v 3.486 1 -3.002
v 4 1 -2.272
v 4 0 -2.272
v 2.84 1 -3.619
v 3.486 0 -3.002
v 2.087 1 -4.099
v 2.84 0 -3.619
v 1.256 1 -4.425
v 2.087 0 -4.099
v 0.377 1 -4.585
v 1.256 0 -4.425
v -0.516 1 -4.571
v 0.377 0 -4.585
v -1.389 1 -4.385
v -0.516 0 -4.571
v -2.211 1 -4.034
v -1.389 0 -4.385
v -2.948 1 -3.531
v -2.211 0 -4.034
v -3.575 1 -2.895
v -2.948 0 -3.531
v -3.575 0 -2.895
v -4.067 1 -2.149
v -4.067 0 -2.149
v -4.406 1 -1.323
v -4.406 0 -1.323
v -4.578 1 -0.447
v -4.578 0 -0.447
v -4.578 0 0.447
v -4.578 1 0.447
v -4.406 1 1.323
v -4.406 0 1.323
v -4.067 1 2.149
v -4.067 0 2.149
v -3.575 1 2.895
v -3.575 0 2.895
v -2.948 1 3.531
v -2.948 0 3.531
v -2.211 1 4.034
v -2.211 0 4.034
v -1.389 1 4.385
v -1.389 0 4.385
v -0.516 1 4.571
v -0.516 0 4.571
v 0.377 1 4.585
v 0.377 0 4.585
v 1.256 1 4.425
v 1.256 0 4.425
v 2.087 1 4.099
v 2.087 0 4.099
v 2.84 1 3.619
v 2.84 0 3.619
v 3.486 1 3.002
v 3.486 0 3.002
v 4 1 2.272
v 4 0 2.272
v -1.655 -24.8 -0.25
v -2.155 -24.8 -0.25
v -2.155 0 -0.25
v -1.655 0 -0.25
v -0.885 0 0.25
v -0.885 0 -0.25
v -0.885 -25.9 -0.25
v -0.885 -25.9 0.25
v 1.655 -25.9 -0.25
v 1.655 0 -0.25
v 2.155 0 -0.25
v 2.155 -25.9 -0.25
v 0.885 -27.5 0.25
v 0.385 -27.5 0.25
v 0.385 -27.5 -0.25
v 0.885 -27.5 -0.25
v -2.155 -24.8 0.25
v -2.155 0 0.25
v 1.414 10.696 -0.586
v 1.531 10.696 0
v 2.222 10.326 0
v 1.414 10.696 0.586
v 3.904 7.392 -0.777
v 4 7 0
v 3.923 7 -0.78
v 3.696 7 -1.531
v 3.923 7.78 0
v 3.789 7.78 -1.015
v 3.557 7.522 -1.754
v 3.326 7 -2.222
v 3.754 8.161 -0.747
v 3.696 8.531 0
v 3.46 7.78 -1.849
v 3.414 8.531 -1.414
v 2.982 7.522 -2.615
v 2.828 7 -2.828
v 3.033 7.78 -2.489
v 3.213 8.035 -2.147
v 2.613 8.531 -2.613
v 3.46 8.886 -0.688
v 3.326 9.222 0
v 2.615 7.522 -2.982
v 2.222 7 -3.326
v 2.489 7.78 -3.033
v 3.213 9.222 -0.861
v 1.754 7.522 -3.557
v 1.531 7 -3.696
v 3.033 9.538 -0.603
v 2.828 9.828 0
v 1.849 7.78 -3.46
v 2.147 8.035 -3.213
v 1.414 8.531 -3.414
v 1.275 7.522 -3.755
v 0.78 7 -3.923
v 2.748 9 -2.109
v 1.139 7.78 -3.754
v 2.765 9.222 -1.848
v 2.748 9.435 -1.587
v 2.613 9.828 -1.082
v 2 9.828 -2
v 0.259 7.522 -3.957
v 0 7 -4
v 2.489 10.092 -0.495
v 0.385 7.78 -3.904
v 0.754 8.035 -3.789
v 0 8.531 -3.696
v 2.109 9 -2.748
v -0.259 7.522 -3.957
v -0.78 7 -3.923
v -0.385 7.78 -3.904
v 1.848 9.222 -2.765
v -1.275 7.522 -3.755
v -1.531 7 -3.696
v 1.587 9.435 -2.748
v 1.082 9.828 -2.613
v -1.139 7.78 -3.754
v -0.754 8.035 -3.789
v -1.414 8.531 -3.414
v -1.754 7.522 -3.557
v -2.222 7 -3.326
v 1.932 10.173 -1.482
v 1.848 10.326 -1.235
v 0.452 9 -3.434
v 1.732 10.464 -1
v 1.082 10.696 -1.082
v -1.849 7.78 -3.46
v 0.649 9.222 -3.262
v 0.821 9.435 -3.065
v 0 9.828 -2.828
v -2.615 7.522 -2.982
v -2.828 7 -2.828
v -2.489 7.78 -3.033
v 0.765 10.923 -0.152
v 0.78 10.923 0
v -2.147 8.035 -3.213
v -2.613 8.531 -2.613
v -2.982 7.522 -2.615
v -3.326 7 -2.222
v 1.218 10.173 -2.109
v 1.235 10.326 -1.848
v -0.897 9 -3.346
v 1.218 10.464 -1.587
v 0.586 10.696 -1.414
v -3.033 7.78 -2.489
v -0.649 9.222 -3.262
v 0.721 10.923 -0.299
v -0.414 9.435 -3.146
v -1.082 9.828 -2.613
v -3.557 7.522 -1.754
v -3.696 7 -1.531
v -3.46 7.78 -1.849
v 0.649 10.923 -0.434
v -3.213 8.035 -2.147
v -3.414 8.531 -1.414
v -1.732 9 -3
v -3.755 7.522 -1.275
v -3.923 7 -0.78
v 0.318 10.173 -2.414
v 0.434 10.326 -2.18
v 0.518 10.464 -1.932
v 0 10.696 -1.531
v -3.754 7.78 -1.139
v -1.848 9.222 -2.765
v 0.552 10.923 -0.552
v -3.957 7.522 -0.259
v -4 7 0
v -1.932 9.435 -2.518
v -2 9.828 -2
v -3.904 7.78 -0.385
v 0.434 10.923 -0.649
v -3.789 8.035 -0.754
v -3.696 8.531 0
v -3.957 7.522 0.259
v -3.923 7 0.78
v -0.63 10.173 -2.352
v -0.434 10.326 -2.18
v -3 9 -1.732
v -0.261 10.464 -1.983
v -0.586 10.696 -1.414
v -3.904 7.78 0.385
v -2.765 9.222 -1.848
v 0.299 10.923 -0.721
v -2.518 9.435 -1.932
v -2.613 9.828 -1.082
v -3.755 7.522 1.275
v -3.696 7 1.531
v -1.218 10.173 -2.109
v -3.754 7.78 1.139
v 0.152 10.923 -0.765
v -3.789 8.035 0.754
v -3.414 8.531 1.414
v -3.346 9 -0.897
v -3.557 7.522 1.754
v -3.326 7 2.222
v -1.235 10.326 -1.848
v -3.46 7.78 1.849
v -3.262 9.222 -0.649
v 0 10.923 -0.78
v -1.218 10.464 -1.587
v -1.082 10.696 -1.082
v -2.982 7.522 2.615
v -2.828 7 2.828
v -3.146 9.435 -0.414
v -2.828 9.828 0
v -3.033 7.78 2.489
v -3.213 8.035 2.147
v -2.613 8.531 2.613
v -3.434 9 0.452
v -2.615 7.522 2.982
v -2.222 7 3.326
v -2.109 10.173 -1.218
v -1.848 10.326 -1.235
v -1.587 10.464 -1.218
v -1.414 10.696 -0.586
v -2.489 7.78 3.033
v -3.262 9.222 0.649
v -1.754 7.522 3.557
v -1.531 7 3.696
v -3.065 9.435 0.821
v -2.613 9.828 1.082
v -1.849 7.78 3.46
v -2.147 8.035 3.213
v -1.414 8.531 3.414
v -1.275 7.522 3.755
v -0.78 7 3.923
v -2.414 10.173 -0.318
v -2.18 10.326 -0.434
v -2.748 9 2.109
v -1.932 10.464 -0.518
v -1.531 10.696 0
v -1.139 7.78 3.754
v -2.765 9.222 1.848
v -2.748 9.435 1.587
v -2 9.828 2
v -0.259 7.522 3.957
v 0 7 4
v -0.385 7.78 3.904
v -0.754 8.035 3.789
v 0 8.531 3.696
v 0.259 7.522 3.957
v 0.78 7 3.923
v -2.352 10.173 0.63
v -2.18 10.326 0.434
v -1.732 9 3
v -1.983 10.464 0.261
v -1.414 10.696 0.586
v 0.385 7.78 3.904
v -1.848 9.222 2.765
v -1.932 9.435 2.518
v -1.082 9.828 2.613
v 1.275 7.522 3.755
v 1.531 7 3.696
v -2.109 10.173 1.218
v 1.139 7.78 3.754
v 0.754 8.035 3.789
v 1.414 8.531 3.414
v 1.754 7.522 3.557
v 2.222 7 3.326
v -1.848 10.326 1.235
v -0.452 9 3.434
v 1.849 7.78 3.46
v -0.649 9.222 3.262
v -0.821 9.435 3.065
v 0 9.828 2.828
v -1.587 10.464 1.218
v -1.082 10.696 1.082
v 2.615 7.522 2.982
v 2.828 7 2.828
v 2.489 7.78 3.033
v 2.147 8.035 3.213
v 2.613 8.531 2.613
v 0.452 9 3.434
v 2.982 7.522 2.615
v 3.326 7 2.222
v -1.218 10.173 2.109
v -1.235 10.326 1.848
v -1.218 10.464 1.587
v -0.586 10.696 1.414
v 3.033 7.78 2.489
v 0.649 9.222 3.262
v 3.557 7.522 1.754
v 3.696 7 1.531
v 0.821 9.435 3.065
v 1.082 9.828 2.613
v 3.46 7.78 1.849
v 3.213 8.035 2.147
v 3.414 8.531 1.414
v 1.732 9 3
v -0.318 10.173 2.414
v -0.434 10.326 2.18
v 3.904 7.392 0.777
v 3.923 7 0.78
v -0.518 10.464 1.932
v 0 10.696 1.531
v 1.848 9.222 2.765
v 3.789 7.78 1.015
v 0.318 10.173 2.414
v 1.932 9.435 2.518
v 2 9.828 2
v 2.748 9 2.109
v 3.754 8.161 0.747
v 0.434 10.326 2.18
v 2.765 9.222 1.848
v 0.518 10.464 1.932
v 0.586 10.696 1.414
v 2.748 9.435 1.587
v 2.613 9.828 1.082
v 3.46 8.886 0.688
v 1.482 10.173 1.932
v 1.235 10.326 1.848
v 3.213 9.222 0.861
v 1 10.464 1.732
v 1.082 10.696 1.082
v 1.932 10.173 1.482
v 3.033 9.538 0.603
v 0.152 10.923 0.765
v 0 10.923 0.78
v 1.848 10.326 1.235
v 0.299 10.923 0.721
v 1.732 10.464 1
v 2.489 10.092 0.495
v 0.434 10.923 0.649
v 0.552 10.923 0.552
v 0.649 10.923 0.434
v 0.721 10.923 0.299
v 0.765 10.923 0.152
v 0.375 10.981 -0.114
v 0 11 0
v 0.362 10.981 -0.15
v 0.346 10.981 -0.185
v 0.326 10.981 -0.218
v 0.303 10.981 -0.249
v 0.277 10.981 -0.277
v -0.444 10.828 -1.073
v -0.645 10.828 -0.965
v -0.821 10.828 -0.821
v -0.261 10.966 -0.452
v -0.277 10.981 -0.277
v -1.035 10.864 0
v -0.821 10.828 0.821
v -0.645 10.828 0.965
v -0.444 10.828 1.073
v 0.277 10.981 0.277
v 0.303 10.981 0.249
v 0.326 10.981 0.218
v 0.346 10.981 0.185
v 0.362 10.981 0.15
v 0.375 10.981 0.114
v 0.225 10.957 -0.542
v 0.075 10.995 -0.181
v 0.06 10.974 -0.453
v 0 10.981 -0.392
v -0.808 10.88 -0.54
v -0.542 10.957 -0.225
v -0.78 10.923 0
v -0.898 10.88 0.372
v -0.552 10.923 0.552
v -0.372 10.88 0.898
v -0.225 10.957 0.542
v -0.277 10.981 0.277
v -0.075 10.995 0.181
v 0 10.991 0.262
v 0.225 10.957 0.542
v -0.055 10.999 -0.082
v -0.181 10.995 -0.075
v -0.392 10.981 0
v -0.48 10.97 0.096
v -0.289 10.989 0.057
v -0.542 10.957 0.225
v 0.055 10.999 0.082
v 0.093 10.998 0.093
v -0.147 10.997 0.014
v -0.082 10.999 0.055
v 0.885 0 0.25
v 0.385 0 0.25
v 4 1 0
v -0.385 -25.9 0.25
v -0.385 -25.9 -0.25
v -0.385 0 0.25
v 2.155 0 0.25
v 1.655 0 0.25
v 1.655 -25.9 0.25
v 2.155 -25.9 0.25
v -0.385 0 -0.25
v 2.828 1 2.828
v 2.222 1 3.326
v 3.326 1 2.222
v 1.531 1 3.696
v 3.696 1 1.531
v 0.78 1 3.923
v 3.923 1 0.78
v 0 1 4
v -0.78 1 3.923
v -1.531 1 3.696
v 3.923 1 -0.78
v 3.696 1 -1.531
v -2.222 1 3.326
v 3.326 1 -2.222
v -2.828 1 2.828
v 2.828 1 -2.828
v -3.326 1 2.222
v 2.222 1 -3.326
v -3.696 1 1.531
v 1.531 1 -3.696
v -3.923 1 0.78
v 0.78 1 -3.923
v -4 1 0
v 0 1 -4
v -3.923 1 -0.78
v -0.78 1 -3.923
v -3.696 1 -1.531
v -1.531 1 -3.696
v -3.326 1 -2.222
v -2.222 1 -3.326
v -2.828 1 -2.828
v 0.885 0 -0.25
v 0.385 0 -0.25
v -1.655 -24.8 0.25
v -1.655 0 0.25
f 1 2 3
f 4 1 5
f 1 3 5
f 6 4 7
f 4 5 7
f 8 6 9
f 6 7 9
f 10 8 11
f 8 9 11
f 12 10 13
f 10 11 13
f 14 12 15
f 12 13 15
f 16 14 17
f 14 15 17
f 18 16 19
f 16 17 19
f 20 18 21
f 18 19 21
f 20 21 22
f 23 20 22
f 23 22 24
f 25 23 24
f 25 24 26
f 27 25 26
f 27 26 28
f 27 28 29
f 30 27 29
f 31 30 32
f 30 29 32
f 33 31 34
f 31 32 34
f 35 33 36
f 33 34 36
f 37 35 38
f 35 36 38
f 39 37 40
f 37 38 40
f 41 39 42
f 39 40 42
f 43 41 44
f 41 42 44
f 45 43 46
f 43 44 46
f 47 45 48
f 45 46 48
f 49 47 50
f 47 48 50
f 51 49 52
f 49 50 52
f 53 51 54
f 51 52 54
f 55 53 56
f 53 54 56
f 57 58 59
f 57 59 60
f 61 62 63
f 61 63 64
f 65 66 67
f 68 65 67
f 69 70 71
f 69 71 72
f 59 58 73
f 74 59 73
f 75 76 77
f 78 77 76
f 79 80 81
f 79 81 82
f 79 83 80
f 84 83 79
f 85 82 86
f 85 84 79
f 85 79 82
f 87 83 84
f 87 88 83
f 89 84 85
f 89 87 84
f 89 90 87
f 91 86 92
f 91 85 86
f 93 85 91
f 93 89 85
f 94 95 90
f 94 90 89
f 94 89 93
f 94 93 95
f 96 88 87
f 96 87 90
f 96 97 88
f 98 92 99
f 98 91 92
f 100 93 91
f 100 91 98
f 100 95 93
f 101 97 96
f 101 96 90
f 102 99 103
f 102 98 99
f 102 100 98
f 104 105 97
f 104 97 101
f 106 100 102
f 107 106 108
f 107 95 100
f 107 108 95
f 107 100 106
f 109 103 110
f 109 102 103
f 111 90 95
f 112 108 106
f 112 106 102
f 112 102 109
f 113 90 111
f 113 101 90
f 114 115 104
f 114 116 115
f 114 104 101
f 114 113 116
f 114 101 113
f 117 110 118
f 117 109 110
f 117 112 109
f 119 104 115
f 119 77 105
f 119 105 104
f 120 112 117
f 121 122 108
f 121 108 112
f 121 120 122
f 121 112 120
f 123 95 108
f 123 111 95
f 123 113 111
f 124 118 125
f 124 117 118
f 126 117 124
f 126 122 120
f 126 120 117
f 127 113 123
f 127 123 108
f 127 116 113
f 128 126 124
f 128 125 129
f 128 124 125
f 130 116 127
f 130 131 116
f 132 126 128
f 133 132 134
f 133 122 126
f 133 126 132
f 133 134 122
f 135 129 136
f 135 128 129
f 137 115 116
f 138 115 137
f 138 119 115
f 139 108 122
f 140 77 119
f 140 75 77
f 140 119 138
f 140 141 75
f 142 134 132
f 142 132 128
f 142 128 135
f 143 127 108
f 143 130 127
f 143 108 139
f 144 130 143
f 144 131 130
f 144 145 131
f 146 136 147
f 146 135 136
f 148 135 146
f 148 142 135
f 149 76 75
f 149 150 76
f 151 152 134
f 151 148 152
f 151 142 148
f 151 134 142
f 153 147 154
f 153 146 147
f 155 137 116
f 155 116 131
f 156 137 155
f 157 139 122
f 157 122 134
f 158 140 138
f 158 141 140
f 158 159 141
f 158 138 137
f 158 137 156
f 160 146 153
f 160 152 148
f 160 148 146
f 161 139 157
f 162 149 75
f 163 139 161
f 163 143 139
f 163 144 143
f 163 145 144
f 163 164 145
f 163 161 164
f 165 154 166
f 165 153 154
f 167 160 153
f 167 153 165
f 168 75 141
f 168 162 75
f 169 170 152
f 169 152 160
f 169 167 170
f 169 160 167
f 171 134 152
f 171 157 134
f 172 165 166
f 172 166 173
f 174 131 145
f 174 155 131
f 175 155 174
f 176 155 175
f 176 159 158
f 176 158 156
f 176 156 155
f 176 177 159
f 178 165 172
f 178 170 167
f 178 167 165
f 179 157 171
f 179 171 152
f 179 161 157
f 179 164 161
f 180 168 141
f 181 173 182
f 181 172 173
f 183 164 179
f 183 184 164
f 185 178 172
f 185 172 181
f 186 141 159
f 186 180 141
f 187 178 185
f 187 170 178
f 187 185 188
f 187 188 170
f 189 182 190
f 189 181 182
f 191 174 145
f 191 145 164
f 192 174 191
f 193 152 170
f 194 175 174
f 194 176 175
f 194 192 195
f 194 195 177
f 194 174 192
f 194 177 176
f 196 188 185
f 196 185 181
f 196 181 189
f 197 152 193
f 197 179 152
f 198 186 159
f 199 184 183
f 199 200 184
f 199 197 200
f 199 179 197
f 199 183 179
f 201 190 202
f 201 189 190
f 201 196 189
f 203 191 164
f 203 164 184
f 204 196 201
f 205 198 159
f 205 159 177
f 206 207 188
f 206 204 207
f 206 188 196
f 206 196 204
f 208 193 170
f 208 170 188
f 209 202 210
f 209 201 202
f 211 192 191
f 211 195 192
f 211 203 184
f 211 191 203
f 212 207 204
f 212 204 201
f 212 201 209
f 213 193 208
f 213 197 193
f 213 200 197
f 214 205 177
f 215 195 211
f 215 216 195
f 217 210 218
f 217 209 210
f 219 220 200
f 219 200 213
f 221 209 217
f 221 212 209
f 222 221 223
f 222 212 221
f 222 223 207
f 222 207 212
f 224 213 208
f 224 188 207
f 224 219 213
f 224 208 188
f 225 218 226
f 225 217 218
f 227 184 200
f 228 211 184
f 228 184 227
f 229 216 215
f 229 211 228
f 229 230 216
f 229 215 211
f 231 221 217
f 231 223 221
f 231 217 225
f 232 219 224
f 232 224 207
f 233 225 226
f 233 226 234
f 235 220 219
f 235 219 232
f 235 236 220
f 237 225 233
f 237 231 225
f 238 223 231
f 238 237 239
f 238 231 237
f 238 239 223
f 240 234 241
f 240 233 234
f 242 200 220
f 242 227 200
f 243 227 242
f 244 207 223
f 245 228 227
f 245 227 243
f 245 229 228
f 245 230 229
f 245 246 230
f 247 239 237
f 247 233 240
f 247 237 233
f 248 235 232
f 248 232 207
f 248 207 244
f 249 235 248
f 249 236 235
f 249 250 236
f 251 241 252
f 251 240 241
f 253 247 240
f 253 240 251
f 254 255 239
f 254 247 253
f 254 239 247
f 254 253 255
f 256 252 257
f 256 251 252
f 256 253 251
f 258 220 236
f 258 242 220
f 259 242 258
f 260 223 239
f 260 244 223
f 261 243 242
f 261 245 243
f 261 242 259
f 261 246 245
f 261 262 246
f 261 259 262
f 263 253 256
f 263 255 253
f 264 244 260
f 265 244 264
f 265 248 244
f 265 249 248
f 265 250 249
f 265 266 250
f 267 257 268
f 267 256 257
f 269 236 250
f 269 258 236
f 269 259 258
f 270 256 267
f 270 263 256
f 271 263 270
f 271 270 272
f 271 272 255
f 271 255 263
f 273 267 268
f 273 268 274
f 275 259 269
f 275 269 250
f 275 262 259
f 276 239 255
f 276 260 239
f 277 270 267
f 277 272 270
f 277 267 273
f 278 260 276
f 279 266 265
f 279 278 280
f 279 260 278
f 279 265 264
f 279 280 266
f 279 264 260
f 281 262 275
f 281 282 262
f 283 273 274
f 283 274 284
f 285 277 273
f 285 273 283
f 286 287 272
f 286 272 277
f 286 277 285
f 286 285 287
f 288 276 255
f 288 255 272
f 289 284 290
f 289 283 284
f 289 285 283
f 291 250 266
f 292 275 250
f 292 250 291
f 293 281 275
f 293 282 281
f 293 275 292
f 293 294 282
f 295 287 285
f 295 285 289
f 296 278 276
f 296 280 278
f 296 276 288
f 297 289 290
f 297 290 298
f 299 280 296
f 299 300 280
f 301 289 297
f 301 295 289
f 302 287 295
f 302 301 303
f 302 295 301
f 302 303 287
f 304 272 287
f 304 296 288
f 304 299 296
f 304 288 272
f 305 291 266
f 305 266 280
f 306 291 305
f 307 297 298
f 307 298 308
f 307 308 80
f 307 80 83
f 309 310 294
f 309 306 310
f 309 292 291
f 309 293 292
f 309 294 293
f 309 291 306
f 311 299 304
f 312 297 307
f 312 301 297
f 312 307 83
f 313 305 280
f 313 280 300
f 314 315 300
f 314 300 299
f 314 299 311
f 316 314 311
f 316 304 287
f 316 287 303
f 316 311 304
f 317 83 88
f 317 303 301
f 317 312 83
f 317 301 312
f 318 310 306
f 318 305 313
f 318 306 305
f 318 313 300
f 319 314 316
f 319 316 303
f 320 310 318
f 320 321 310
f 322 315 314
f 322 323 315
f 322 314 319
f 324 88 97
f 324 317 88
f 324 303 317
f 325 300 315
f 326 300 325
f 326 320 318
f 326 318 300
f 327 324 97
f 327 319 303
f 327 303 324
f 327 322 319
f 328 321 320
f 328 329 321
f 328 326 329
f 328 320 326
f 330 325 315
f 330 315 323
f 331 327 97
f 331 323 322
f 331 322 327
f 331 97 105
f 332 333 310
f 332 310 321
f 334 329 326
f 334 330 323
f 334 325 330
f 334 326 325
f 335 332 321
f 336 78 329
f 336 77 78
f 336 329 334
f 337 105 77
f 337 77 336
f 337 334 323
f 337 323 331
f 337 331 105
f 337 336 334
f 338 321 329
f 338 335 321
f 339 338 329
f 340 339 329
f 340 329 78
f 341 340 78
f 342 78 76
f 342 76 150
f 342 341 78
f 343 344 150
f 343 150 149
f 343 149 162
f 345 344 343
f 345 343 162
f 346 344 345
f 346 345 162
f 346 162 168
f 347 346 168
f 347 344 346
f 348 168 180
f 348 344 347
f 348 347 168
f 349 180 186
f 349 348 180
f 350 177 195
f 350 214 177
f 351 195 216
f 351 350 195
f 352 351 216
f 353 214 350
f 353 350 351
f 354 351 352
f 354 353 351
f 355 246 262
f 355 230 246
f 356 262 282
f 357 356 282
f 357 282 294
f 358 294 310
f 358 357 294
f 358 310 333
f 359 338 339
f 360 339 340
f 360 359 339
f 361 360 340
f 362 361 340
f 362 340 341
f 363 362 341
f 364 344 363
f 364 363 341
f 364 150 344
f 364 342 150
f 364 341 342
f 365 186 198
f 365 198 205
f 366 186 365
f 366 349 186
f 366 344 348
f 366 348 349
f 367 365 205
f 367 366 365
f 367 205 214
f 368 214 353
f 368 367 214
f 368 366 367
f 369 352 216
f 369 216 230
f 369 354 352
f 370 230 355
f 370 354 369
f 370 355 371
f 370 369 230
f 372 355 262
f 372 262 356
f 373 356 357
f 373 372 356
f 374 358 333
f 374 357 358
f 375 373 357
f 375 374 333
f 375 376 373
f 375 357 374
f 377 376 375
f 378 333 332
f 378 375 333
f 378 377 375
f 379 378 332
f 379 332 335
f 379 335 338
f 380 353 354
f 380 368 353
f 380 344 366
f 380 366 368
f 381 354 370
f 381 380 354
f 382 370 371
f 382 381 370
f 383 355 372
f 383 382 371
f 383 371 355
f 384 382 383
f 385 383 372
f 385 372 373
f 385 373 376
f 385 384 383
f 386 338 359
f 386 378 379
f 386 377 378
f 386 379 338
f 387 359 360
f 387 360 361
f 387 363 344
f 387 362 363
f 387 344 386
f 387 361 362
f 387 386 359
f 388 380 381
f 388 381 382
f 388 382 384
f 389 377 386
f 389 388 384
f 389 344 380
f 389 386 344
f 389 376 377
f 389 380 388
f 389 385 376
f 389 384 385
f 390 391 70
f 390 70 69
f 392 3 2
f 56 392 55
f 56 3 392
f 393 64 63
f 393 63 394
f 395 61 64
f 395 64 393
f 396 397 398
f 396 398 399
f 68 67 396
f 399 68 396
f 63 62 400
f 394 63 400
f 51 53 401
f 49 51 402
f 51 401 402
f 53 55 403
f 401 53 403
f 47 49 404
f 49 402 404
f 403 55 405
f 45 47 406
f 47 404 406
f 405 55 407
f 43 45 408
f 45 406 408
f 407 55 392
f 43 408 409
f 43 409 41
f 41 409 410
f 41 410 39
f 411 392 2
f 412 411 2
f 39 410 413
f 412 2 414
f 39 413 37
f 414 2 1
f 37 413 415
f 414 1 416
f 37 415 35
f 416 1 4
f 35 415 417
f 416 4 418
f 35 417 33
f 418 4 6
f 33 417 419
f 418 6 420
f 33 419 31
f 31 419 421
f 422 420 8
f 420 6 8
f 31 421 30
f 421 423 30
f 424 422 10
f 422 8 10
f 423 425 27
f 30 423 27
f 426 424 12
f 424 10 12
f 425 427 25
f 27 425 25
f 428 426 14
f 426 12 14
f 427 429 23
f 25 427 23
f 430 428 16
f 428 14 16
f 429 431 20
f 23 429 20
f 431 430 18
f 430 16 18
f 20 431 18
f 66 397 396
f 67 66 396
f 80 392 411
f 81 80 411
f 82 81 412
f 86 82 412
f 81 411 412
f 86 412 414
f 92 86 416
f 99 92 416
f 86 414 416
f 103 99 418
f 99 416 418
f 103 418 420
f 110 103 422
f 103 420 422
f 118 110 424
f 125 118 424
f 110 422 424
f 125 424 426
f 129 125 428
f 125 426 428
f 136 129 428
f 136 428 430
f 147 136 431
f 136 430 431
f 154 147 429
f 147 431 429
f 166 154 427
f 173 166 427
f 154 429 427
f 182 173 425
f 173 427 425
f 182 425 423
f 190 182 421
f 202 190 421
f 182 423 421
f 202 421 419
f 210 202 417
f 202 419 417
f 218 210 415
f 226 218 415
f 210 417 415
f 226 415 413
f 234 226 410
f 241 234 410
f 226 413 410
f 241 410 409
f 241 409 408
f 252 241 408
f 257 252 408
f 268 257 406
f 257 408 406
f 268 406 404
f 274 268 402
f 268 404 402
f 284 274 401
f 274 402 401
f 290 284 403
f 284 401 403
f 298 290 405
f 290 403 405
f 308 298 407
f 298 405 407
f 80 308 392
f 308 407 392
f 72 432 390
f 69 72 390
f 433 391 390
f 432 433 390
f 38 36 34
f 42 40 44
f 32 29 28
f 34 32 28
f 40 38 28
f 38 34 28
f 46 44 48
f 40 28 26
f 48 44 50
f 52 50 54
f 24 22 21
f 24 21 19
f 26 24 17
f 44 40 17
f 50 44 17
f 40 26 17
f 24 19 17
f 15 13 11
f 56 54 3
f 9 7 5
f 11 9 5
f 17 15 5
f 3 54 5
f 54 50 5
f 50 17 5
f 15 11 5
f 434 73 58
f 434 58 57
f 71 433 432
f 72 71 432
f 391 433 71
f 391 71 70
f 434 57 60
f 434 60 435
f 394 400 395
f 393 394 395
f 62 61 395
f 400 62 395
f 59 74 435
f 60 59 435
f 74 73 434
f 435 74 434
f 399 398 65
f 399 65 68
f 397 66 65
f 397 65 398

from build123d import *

# Parameters (mm, degrees)
SKETCH002_W  = 1
SKETCH002_H  = 6.098212
POCKET_DEPTH = 5
SKETCH006_W  = 0.5
SKETCH006_H  = 0.5
PAD_DEPTH    = 24.8
SKETCH008_W  = 0.5
SKETCH008_H  = 0.5
PAD001_DEPTH = 25.9
SKETCH010_W  = 0.5
SKETCH010_H  = 0.5
PAD002_DEPTH = 27.5
SKETCH012_W  = 0.5
SKETCH012_H  = 0.5
PAD003_DEPTH = 25.9


with BuildPart() as led_plastic:
    # Sketch → Revolution (revolve)
    with BuildSketch(Plane.XY):
        with BuildLine():
            ThreePointArc((4, 7), (2.828427, 9.828427), (0, 11))
            Line((0, 0), (0, 11))
            Line((4.6, 0), (0, 0))
            Line((4.6, 1), (4.6, 0))
            Line((4, 1), (4.6, 1))
            Line((4, 7), (4, 1))
        make_face()
    revolve(axis=Axis((0, 0, 0), (0, 1, 0)))

    # Sketch002 (on Face2 of Revolution) → Pocket (cut)
    with BuildSketch(Plane.XZ):
        with Locations((4.5, 0)):
            Rectangle(SKETCH002_W, SKETCH002_H)
    extrude(amount=-POCKET_DEPTH, mode=Mode.SUBTRACT)


with BuildPart() as lead4:
    # Sketch006 (on ShapeBinder) → Pad (new body)
    with BuildSketch(Plane.XZ):
        with Locations((-1.905, 0)):
            Rectangle(SKETCH006_W, SKETCH006_H)
    extrude(amount=PAD_DEPTH)


with BuildPart() as lead3:
    # Sketch008 (on ShapeBinder) → Pad001 (new body)
    with BuildSketch(Plane.XZ):
        with Locations((-0.635, 0)):
            Rectangle(SKETCH008_W, SKETCH008_H)
    extrude(amount=PAD001_DEPTH)


with BuildPart() as lead2:
    # Sketch010 (on ShapeBinder) → Pad002 (new body)
    with BuildSketch(Plane.XZ):
        with Locations((0.635, 0)):
            Rectangle(SKETCH010_W, SKETCH010_H)
    extrude(amount=PAD002_DEPTH)


with BuildPart() as lead1:
    # Sketch012 (on ShapeBinder) → Pad003 (new body)
    with BuildSketch(Plane.XZ):
        with Locations((1.905, 0)):
            Rectangle(SKETCH012_W, SKETCH012_H)
    extrude(amount=PAD003_DEPTH)


solid = Compound([led_plastic.part, lead4.part, lead3.part, lead2.part, lead1.part])
